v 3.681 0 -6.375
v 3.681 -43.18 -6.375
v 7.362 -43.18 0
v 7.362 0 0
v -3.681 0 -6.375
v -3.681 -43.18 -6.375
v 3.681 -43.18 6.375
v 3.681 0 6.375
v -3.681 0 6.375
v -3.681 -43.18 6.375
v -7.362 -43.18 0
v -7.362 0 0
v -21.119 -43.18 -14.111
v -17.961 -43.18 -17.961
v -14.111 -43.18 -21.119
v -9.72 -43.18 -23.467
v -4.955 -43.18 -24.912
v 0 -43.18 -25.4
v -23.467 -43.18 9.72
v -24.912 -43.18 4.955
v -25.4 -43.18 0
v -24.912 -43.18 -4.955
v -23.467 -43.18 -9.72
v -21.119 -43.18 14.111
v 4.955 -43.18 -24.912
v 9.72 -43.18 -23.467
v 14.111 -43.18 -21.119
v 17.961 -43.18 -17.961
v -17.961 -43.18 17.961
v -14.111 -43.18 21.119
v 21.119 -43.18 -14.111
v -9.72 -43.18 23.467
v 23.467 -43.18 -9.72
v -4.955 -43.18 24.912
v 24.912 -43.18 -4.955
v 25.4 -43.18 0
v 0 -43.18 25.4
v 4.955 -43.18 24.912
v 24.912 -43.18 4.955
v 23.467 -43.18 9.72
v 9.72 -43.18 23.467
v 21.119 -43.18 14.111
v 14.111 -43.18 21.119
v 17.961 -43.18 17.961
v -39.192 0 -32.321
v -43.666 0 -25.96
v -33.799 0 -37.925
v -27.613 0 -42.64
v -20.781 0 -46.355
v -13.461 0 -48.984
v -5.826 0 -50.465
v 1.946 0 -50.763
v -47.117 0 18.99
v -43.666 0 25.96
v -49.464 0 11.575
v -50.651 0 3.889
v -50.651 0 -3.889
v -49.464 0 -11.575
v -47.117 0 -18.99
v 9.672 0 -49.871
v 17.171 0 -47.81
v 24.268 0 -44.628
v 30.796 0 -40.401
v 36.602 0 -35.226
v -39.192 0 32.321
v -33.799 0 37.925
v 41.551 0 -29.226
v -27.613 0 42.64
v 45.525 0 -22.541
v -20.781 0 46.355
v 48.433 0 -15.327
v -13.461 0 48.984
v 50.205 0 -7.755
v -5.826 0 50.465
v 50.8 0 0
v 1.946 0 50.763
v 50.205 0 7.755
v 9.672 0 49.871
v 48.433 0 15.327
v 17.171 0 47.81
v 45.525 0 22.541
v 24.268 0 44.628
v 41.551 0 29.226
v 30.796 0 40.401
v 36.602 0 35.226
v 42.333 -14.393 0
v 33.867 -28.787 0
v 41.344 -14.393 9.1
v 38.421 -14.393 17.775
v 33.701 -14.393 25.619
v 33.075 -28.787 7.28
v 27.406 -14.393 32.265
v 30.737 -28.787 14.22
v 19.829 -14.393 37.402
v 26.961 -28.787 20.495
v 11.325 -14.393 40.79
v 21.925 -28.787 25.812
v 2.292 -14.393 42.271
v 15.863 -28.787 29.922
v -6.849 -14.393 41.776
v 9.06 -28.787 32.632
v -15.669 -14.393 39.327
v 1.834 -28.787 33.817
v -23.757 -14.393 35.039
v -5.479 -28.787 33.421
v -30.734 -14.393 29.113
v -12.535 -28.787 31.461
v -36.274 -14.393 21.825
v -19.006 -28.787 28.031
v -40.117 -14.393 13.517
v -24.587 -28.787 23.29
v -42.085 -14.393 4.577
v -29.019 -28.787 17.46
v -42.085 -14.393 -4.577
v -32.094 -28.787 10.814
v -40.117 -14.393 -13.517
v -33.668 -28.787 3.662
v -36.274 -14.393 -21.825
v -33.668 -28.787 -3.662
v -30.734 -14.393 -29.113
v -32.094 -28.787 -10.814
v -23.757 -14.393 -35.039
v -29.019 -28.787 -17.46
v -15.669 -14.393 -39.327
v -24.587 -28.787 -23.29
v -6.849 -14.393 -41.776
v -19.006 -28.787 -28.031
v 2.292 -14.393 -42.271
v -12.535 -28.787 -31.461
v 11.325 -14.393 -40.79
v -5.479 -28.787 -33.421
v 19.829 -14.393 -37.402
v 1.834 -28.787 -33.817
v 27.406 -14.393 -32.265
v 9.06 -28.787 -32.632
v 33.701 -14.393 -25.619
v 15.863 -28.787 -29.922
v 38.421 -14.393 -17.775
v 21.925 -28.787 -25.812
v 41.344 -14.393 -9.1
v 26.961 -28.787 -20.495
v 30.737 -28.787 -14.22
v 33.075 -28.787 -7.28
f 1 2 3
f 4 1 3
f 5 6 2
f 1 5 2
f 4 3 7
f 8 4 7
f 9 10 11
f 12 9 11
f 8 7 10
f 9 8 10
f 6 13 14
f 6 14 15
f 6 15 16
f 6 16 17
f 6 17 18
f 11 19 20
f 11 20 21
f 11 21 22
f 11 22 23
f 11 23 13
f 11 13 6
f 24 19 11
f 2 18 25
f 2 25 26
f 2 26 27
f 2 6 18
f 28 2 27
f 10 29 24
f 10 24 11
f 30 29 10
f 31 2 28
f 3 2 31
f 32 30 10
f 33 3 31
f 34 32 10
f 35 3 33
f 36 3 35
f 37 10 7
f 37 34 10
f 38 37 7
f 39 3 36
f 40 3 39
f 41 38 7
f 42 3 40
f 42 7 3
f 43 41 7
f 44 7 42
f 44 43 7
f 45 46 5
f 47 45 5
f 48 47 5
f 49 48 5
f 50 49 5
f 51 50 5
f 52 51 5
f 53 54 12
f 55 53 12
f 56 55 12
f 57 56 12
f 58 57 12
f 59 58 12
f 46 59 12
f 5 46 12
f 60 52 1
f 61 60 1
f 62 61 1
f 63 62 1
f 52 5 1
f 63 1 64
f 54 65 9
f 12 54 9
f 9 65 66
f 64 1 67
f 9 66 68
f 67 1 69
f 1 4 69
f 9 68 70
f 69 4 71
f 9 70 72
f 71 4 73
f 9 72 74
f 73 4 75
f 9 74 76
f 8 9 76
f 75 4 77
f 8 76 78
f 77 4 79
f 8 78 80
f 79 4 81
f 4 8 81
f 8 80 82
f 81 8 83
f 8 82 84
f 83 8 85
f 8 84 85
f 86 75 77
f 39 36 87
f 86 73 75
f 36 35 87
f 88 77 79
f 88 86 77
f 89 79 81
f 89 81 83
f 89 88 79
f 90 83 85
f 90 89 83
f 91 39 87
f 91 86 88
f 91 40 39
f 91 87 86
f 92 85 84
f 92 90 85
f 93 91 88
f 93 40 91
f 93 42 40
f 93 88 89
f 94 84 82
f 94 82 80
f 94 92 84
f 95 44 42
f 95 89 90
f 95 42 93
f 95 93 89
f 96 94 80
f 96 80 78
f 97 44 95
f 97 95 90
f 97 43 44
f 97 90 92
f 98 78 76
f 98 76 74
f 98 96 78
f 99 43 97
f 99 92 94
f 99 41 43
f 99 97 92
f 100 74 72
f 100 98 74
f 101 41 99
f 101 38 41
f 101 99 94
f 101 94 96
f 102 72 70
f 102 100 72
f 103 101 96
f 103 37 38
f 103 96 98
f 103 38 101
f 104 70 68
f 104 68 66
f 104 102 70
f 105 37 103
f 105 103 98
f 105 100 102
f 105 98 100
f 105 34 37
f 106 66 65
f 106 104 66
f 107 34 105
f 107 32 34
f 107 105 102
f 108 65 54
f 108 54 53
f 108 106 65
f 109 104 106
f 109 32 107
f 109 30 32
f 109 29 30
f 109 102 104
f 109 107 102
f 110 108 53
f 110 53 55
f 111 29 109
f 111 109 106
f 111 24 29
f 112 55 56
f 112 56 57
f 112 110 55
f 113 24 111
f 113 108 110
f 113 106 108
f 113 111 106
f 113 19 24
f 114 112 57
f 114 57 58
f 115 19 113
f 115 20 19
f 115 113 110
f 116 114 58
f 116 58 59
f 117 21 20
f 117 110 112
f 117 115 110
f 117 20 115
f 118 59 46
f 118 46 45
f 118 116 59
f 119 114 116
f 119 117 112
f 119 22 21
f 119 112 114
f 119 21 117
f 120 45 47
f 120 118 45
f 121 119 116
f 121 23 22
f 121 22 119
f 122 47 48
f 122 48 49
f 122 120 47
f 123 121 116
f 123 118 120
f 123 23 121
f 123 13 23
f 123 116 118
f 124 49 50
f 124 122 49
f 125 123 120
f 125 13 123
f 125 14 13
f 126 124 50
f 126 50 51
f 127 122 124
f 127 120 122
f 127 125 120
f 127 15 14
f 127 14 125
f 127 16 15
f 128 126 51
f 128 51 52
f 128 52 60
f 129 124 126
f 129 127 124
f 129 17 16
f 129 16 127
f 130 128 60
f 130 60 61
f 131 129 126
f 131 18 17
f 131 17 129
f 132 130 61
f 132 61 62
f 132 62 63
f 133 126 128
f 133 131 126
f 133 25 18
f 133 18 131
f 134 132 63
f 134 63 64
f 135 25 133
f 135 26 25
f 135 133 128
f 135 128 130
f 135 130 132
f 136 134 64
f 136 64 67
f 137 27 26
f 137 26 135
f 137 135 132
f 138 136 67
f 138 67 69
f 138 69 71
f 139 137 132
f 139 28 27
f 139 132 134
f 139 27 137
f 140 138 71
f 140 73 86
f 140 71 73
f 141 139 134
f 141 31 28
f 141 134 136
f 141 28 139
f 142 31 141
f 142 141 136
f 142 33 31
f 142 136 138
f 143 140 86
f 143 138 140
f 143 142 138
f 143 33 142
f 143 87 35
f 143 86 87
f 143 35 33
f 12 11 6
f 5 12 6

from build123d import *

# Parameters (mm, degrees)
F0_R     = 50.8
F2_R     = 25.4
F5_DEPTH = 60.706


with BuildPart() as f3:
    # F0 (on Front) → F3 section 0
    with BuildSketch(Plane.XZ):
        Circle(F0_R)
    # F2 (on offset) → F3 section 1
    with BuildSketch(Plane.XZ.offset(43.18)):
        Circle(F2_R)
    loft()

    # F4 (on face) → F5 (cut)
    with BuildSketch(Plane.XZ.offset(43.18)):
        Polygon((-3.6808389062, -6.3754), (3.6808389062, -6.3754), (7.3616778124, 0), (3.6808389062, 6.3754), (-3.6808389062, 6.3754), (-7.3616778124, 0), align=None)
    extrude(amount=-F5_DEPTH, mode=Mode.SUBTRACT)


solid = f3.part
